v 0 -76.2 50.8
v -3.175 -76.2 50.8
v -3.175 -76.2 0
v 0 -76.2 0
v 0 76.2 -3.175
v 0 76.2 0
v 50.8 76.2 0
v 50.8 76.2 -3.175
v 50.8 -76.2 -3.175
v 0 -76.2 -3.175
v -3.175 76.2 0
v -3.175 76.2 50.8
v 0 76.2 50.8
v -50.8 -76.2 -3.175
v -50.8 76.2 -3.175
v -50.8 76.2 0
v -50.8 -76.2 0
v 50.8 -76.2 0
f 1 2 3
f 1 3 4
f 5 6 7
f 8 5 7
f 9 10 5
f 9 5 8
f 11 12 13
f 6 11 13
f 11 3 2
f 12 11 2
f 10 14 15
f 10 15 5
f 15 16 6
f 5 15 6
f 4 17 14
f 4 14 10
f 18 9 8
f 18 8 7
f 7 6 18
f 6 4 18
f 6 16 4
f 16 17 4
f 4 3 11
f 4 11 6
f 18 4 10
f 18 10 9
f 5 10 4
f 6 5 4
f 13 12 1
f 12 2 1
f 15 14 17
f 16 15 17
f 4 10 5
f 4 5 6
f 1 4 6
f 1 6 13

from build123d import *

# Parameters (mm, degrees)
F0_W     = 3.175
F0_H     = 50.8
F1_DEPTH = 76.2
F2_W     = 50.8
F2_H     = 3.175
F3_DEPTH = 76.2
F4_W     = 50.8
F4_H     = 3.175
F5_DEPTH = 76.2


with BuildPart() as f1:
    # F0 (on Front) → F1 (new body, symmetric)
    with BuildSketch(Plane.XZ):
        with Locations((-1.5875, 25.4)):
            Rectangle(F0_W, F0_H)
    extrude(amount=F1_DEPTH, both=True)


with BuildPart() as f3:
    # F2 (on Front) → F3 (new body, symmetric)
    with BuildSketch(Plane.XZ):
        with Locations((-25.4, -1.5875)):
            Rectangle(F2_W, F2_H)
    extrude(amount=F3_DEPTH, both=True)


with BuildPart() as f5:
    # F4 (on Front) → F5 (new body, symmetric)
    with BuildSketch(Plane.XZ):
        with Locations((25.4, -1.5875)):
            Rectangle(F4_W, F4_H)
    extrude(amount=F5_DEPTH, both=True)


solid = Compound([f1.part, f3.part, f5.part])
